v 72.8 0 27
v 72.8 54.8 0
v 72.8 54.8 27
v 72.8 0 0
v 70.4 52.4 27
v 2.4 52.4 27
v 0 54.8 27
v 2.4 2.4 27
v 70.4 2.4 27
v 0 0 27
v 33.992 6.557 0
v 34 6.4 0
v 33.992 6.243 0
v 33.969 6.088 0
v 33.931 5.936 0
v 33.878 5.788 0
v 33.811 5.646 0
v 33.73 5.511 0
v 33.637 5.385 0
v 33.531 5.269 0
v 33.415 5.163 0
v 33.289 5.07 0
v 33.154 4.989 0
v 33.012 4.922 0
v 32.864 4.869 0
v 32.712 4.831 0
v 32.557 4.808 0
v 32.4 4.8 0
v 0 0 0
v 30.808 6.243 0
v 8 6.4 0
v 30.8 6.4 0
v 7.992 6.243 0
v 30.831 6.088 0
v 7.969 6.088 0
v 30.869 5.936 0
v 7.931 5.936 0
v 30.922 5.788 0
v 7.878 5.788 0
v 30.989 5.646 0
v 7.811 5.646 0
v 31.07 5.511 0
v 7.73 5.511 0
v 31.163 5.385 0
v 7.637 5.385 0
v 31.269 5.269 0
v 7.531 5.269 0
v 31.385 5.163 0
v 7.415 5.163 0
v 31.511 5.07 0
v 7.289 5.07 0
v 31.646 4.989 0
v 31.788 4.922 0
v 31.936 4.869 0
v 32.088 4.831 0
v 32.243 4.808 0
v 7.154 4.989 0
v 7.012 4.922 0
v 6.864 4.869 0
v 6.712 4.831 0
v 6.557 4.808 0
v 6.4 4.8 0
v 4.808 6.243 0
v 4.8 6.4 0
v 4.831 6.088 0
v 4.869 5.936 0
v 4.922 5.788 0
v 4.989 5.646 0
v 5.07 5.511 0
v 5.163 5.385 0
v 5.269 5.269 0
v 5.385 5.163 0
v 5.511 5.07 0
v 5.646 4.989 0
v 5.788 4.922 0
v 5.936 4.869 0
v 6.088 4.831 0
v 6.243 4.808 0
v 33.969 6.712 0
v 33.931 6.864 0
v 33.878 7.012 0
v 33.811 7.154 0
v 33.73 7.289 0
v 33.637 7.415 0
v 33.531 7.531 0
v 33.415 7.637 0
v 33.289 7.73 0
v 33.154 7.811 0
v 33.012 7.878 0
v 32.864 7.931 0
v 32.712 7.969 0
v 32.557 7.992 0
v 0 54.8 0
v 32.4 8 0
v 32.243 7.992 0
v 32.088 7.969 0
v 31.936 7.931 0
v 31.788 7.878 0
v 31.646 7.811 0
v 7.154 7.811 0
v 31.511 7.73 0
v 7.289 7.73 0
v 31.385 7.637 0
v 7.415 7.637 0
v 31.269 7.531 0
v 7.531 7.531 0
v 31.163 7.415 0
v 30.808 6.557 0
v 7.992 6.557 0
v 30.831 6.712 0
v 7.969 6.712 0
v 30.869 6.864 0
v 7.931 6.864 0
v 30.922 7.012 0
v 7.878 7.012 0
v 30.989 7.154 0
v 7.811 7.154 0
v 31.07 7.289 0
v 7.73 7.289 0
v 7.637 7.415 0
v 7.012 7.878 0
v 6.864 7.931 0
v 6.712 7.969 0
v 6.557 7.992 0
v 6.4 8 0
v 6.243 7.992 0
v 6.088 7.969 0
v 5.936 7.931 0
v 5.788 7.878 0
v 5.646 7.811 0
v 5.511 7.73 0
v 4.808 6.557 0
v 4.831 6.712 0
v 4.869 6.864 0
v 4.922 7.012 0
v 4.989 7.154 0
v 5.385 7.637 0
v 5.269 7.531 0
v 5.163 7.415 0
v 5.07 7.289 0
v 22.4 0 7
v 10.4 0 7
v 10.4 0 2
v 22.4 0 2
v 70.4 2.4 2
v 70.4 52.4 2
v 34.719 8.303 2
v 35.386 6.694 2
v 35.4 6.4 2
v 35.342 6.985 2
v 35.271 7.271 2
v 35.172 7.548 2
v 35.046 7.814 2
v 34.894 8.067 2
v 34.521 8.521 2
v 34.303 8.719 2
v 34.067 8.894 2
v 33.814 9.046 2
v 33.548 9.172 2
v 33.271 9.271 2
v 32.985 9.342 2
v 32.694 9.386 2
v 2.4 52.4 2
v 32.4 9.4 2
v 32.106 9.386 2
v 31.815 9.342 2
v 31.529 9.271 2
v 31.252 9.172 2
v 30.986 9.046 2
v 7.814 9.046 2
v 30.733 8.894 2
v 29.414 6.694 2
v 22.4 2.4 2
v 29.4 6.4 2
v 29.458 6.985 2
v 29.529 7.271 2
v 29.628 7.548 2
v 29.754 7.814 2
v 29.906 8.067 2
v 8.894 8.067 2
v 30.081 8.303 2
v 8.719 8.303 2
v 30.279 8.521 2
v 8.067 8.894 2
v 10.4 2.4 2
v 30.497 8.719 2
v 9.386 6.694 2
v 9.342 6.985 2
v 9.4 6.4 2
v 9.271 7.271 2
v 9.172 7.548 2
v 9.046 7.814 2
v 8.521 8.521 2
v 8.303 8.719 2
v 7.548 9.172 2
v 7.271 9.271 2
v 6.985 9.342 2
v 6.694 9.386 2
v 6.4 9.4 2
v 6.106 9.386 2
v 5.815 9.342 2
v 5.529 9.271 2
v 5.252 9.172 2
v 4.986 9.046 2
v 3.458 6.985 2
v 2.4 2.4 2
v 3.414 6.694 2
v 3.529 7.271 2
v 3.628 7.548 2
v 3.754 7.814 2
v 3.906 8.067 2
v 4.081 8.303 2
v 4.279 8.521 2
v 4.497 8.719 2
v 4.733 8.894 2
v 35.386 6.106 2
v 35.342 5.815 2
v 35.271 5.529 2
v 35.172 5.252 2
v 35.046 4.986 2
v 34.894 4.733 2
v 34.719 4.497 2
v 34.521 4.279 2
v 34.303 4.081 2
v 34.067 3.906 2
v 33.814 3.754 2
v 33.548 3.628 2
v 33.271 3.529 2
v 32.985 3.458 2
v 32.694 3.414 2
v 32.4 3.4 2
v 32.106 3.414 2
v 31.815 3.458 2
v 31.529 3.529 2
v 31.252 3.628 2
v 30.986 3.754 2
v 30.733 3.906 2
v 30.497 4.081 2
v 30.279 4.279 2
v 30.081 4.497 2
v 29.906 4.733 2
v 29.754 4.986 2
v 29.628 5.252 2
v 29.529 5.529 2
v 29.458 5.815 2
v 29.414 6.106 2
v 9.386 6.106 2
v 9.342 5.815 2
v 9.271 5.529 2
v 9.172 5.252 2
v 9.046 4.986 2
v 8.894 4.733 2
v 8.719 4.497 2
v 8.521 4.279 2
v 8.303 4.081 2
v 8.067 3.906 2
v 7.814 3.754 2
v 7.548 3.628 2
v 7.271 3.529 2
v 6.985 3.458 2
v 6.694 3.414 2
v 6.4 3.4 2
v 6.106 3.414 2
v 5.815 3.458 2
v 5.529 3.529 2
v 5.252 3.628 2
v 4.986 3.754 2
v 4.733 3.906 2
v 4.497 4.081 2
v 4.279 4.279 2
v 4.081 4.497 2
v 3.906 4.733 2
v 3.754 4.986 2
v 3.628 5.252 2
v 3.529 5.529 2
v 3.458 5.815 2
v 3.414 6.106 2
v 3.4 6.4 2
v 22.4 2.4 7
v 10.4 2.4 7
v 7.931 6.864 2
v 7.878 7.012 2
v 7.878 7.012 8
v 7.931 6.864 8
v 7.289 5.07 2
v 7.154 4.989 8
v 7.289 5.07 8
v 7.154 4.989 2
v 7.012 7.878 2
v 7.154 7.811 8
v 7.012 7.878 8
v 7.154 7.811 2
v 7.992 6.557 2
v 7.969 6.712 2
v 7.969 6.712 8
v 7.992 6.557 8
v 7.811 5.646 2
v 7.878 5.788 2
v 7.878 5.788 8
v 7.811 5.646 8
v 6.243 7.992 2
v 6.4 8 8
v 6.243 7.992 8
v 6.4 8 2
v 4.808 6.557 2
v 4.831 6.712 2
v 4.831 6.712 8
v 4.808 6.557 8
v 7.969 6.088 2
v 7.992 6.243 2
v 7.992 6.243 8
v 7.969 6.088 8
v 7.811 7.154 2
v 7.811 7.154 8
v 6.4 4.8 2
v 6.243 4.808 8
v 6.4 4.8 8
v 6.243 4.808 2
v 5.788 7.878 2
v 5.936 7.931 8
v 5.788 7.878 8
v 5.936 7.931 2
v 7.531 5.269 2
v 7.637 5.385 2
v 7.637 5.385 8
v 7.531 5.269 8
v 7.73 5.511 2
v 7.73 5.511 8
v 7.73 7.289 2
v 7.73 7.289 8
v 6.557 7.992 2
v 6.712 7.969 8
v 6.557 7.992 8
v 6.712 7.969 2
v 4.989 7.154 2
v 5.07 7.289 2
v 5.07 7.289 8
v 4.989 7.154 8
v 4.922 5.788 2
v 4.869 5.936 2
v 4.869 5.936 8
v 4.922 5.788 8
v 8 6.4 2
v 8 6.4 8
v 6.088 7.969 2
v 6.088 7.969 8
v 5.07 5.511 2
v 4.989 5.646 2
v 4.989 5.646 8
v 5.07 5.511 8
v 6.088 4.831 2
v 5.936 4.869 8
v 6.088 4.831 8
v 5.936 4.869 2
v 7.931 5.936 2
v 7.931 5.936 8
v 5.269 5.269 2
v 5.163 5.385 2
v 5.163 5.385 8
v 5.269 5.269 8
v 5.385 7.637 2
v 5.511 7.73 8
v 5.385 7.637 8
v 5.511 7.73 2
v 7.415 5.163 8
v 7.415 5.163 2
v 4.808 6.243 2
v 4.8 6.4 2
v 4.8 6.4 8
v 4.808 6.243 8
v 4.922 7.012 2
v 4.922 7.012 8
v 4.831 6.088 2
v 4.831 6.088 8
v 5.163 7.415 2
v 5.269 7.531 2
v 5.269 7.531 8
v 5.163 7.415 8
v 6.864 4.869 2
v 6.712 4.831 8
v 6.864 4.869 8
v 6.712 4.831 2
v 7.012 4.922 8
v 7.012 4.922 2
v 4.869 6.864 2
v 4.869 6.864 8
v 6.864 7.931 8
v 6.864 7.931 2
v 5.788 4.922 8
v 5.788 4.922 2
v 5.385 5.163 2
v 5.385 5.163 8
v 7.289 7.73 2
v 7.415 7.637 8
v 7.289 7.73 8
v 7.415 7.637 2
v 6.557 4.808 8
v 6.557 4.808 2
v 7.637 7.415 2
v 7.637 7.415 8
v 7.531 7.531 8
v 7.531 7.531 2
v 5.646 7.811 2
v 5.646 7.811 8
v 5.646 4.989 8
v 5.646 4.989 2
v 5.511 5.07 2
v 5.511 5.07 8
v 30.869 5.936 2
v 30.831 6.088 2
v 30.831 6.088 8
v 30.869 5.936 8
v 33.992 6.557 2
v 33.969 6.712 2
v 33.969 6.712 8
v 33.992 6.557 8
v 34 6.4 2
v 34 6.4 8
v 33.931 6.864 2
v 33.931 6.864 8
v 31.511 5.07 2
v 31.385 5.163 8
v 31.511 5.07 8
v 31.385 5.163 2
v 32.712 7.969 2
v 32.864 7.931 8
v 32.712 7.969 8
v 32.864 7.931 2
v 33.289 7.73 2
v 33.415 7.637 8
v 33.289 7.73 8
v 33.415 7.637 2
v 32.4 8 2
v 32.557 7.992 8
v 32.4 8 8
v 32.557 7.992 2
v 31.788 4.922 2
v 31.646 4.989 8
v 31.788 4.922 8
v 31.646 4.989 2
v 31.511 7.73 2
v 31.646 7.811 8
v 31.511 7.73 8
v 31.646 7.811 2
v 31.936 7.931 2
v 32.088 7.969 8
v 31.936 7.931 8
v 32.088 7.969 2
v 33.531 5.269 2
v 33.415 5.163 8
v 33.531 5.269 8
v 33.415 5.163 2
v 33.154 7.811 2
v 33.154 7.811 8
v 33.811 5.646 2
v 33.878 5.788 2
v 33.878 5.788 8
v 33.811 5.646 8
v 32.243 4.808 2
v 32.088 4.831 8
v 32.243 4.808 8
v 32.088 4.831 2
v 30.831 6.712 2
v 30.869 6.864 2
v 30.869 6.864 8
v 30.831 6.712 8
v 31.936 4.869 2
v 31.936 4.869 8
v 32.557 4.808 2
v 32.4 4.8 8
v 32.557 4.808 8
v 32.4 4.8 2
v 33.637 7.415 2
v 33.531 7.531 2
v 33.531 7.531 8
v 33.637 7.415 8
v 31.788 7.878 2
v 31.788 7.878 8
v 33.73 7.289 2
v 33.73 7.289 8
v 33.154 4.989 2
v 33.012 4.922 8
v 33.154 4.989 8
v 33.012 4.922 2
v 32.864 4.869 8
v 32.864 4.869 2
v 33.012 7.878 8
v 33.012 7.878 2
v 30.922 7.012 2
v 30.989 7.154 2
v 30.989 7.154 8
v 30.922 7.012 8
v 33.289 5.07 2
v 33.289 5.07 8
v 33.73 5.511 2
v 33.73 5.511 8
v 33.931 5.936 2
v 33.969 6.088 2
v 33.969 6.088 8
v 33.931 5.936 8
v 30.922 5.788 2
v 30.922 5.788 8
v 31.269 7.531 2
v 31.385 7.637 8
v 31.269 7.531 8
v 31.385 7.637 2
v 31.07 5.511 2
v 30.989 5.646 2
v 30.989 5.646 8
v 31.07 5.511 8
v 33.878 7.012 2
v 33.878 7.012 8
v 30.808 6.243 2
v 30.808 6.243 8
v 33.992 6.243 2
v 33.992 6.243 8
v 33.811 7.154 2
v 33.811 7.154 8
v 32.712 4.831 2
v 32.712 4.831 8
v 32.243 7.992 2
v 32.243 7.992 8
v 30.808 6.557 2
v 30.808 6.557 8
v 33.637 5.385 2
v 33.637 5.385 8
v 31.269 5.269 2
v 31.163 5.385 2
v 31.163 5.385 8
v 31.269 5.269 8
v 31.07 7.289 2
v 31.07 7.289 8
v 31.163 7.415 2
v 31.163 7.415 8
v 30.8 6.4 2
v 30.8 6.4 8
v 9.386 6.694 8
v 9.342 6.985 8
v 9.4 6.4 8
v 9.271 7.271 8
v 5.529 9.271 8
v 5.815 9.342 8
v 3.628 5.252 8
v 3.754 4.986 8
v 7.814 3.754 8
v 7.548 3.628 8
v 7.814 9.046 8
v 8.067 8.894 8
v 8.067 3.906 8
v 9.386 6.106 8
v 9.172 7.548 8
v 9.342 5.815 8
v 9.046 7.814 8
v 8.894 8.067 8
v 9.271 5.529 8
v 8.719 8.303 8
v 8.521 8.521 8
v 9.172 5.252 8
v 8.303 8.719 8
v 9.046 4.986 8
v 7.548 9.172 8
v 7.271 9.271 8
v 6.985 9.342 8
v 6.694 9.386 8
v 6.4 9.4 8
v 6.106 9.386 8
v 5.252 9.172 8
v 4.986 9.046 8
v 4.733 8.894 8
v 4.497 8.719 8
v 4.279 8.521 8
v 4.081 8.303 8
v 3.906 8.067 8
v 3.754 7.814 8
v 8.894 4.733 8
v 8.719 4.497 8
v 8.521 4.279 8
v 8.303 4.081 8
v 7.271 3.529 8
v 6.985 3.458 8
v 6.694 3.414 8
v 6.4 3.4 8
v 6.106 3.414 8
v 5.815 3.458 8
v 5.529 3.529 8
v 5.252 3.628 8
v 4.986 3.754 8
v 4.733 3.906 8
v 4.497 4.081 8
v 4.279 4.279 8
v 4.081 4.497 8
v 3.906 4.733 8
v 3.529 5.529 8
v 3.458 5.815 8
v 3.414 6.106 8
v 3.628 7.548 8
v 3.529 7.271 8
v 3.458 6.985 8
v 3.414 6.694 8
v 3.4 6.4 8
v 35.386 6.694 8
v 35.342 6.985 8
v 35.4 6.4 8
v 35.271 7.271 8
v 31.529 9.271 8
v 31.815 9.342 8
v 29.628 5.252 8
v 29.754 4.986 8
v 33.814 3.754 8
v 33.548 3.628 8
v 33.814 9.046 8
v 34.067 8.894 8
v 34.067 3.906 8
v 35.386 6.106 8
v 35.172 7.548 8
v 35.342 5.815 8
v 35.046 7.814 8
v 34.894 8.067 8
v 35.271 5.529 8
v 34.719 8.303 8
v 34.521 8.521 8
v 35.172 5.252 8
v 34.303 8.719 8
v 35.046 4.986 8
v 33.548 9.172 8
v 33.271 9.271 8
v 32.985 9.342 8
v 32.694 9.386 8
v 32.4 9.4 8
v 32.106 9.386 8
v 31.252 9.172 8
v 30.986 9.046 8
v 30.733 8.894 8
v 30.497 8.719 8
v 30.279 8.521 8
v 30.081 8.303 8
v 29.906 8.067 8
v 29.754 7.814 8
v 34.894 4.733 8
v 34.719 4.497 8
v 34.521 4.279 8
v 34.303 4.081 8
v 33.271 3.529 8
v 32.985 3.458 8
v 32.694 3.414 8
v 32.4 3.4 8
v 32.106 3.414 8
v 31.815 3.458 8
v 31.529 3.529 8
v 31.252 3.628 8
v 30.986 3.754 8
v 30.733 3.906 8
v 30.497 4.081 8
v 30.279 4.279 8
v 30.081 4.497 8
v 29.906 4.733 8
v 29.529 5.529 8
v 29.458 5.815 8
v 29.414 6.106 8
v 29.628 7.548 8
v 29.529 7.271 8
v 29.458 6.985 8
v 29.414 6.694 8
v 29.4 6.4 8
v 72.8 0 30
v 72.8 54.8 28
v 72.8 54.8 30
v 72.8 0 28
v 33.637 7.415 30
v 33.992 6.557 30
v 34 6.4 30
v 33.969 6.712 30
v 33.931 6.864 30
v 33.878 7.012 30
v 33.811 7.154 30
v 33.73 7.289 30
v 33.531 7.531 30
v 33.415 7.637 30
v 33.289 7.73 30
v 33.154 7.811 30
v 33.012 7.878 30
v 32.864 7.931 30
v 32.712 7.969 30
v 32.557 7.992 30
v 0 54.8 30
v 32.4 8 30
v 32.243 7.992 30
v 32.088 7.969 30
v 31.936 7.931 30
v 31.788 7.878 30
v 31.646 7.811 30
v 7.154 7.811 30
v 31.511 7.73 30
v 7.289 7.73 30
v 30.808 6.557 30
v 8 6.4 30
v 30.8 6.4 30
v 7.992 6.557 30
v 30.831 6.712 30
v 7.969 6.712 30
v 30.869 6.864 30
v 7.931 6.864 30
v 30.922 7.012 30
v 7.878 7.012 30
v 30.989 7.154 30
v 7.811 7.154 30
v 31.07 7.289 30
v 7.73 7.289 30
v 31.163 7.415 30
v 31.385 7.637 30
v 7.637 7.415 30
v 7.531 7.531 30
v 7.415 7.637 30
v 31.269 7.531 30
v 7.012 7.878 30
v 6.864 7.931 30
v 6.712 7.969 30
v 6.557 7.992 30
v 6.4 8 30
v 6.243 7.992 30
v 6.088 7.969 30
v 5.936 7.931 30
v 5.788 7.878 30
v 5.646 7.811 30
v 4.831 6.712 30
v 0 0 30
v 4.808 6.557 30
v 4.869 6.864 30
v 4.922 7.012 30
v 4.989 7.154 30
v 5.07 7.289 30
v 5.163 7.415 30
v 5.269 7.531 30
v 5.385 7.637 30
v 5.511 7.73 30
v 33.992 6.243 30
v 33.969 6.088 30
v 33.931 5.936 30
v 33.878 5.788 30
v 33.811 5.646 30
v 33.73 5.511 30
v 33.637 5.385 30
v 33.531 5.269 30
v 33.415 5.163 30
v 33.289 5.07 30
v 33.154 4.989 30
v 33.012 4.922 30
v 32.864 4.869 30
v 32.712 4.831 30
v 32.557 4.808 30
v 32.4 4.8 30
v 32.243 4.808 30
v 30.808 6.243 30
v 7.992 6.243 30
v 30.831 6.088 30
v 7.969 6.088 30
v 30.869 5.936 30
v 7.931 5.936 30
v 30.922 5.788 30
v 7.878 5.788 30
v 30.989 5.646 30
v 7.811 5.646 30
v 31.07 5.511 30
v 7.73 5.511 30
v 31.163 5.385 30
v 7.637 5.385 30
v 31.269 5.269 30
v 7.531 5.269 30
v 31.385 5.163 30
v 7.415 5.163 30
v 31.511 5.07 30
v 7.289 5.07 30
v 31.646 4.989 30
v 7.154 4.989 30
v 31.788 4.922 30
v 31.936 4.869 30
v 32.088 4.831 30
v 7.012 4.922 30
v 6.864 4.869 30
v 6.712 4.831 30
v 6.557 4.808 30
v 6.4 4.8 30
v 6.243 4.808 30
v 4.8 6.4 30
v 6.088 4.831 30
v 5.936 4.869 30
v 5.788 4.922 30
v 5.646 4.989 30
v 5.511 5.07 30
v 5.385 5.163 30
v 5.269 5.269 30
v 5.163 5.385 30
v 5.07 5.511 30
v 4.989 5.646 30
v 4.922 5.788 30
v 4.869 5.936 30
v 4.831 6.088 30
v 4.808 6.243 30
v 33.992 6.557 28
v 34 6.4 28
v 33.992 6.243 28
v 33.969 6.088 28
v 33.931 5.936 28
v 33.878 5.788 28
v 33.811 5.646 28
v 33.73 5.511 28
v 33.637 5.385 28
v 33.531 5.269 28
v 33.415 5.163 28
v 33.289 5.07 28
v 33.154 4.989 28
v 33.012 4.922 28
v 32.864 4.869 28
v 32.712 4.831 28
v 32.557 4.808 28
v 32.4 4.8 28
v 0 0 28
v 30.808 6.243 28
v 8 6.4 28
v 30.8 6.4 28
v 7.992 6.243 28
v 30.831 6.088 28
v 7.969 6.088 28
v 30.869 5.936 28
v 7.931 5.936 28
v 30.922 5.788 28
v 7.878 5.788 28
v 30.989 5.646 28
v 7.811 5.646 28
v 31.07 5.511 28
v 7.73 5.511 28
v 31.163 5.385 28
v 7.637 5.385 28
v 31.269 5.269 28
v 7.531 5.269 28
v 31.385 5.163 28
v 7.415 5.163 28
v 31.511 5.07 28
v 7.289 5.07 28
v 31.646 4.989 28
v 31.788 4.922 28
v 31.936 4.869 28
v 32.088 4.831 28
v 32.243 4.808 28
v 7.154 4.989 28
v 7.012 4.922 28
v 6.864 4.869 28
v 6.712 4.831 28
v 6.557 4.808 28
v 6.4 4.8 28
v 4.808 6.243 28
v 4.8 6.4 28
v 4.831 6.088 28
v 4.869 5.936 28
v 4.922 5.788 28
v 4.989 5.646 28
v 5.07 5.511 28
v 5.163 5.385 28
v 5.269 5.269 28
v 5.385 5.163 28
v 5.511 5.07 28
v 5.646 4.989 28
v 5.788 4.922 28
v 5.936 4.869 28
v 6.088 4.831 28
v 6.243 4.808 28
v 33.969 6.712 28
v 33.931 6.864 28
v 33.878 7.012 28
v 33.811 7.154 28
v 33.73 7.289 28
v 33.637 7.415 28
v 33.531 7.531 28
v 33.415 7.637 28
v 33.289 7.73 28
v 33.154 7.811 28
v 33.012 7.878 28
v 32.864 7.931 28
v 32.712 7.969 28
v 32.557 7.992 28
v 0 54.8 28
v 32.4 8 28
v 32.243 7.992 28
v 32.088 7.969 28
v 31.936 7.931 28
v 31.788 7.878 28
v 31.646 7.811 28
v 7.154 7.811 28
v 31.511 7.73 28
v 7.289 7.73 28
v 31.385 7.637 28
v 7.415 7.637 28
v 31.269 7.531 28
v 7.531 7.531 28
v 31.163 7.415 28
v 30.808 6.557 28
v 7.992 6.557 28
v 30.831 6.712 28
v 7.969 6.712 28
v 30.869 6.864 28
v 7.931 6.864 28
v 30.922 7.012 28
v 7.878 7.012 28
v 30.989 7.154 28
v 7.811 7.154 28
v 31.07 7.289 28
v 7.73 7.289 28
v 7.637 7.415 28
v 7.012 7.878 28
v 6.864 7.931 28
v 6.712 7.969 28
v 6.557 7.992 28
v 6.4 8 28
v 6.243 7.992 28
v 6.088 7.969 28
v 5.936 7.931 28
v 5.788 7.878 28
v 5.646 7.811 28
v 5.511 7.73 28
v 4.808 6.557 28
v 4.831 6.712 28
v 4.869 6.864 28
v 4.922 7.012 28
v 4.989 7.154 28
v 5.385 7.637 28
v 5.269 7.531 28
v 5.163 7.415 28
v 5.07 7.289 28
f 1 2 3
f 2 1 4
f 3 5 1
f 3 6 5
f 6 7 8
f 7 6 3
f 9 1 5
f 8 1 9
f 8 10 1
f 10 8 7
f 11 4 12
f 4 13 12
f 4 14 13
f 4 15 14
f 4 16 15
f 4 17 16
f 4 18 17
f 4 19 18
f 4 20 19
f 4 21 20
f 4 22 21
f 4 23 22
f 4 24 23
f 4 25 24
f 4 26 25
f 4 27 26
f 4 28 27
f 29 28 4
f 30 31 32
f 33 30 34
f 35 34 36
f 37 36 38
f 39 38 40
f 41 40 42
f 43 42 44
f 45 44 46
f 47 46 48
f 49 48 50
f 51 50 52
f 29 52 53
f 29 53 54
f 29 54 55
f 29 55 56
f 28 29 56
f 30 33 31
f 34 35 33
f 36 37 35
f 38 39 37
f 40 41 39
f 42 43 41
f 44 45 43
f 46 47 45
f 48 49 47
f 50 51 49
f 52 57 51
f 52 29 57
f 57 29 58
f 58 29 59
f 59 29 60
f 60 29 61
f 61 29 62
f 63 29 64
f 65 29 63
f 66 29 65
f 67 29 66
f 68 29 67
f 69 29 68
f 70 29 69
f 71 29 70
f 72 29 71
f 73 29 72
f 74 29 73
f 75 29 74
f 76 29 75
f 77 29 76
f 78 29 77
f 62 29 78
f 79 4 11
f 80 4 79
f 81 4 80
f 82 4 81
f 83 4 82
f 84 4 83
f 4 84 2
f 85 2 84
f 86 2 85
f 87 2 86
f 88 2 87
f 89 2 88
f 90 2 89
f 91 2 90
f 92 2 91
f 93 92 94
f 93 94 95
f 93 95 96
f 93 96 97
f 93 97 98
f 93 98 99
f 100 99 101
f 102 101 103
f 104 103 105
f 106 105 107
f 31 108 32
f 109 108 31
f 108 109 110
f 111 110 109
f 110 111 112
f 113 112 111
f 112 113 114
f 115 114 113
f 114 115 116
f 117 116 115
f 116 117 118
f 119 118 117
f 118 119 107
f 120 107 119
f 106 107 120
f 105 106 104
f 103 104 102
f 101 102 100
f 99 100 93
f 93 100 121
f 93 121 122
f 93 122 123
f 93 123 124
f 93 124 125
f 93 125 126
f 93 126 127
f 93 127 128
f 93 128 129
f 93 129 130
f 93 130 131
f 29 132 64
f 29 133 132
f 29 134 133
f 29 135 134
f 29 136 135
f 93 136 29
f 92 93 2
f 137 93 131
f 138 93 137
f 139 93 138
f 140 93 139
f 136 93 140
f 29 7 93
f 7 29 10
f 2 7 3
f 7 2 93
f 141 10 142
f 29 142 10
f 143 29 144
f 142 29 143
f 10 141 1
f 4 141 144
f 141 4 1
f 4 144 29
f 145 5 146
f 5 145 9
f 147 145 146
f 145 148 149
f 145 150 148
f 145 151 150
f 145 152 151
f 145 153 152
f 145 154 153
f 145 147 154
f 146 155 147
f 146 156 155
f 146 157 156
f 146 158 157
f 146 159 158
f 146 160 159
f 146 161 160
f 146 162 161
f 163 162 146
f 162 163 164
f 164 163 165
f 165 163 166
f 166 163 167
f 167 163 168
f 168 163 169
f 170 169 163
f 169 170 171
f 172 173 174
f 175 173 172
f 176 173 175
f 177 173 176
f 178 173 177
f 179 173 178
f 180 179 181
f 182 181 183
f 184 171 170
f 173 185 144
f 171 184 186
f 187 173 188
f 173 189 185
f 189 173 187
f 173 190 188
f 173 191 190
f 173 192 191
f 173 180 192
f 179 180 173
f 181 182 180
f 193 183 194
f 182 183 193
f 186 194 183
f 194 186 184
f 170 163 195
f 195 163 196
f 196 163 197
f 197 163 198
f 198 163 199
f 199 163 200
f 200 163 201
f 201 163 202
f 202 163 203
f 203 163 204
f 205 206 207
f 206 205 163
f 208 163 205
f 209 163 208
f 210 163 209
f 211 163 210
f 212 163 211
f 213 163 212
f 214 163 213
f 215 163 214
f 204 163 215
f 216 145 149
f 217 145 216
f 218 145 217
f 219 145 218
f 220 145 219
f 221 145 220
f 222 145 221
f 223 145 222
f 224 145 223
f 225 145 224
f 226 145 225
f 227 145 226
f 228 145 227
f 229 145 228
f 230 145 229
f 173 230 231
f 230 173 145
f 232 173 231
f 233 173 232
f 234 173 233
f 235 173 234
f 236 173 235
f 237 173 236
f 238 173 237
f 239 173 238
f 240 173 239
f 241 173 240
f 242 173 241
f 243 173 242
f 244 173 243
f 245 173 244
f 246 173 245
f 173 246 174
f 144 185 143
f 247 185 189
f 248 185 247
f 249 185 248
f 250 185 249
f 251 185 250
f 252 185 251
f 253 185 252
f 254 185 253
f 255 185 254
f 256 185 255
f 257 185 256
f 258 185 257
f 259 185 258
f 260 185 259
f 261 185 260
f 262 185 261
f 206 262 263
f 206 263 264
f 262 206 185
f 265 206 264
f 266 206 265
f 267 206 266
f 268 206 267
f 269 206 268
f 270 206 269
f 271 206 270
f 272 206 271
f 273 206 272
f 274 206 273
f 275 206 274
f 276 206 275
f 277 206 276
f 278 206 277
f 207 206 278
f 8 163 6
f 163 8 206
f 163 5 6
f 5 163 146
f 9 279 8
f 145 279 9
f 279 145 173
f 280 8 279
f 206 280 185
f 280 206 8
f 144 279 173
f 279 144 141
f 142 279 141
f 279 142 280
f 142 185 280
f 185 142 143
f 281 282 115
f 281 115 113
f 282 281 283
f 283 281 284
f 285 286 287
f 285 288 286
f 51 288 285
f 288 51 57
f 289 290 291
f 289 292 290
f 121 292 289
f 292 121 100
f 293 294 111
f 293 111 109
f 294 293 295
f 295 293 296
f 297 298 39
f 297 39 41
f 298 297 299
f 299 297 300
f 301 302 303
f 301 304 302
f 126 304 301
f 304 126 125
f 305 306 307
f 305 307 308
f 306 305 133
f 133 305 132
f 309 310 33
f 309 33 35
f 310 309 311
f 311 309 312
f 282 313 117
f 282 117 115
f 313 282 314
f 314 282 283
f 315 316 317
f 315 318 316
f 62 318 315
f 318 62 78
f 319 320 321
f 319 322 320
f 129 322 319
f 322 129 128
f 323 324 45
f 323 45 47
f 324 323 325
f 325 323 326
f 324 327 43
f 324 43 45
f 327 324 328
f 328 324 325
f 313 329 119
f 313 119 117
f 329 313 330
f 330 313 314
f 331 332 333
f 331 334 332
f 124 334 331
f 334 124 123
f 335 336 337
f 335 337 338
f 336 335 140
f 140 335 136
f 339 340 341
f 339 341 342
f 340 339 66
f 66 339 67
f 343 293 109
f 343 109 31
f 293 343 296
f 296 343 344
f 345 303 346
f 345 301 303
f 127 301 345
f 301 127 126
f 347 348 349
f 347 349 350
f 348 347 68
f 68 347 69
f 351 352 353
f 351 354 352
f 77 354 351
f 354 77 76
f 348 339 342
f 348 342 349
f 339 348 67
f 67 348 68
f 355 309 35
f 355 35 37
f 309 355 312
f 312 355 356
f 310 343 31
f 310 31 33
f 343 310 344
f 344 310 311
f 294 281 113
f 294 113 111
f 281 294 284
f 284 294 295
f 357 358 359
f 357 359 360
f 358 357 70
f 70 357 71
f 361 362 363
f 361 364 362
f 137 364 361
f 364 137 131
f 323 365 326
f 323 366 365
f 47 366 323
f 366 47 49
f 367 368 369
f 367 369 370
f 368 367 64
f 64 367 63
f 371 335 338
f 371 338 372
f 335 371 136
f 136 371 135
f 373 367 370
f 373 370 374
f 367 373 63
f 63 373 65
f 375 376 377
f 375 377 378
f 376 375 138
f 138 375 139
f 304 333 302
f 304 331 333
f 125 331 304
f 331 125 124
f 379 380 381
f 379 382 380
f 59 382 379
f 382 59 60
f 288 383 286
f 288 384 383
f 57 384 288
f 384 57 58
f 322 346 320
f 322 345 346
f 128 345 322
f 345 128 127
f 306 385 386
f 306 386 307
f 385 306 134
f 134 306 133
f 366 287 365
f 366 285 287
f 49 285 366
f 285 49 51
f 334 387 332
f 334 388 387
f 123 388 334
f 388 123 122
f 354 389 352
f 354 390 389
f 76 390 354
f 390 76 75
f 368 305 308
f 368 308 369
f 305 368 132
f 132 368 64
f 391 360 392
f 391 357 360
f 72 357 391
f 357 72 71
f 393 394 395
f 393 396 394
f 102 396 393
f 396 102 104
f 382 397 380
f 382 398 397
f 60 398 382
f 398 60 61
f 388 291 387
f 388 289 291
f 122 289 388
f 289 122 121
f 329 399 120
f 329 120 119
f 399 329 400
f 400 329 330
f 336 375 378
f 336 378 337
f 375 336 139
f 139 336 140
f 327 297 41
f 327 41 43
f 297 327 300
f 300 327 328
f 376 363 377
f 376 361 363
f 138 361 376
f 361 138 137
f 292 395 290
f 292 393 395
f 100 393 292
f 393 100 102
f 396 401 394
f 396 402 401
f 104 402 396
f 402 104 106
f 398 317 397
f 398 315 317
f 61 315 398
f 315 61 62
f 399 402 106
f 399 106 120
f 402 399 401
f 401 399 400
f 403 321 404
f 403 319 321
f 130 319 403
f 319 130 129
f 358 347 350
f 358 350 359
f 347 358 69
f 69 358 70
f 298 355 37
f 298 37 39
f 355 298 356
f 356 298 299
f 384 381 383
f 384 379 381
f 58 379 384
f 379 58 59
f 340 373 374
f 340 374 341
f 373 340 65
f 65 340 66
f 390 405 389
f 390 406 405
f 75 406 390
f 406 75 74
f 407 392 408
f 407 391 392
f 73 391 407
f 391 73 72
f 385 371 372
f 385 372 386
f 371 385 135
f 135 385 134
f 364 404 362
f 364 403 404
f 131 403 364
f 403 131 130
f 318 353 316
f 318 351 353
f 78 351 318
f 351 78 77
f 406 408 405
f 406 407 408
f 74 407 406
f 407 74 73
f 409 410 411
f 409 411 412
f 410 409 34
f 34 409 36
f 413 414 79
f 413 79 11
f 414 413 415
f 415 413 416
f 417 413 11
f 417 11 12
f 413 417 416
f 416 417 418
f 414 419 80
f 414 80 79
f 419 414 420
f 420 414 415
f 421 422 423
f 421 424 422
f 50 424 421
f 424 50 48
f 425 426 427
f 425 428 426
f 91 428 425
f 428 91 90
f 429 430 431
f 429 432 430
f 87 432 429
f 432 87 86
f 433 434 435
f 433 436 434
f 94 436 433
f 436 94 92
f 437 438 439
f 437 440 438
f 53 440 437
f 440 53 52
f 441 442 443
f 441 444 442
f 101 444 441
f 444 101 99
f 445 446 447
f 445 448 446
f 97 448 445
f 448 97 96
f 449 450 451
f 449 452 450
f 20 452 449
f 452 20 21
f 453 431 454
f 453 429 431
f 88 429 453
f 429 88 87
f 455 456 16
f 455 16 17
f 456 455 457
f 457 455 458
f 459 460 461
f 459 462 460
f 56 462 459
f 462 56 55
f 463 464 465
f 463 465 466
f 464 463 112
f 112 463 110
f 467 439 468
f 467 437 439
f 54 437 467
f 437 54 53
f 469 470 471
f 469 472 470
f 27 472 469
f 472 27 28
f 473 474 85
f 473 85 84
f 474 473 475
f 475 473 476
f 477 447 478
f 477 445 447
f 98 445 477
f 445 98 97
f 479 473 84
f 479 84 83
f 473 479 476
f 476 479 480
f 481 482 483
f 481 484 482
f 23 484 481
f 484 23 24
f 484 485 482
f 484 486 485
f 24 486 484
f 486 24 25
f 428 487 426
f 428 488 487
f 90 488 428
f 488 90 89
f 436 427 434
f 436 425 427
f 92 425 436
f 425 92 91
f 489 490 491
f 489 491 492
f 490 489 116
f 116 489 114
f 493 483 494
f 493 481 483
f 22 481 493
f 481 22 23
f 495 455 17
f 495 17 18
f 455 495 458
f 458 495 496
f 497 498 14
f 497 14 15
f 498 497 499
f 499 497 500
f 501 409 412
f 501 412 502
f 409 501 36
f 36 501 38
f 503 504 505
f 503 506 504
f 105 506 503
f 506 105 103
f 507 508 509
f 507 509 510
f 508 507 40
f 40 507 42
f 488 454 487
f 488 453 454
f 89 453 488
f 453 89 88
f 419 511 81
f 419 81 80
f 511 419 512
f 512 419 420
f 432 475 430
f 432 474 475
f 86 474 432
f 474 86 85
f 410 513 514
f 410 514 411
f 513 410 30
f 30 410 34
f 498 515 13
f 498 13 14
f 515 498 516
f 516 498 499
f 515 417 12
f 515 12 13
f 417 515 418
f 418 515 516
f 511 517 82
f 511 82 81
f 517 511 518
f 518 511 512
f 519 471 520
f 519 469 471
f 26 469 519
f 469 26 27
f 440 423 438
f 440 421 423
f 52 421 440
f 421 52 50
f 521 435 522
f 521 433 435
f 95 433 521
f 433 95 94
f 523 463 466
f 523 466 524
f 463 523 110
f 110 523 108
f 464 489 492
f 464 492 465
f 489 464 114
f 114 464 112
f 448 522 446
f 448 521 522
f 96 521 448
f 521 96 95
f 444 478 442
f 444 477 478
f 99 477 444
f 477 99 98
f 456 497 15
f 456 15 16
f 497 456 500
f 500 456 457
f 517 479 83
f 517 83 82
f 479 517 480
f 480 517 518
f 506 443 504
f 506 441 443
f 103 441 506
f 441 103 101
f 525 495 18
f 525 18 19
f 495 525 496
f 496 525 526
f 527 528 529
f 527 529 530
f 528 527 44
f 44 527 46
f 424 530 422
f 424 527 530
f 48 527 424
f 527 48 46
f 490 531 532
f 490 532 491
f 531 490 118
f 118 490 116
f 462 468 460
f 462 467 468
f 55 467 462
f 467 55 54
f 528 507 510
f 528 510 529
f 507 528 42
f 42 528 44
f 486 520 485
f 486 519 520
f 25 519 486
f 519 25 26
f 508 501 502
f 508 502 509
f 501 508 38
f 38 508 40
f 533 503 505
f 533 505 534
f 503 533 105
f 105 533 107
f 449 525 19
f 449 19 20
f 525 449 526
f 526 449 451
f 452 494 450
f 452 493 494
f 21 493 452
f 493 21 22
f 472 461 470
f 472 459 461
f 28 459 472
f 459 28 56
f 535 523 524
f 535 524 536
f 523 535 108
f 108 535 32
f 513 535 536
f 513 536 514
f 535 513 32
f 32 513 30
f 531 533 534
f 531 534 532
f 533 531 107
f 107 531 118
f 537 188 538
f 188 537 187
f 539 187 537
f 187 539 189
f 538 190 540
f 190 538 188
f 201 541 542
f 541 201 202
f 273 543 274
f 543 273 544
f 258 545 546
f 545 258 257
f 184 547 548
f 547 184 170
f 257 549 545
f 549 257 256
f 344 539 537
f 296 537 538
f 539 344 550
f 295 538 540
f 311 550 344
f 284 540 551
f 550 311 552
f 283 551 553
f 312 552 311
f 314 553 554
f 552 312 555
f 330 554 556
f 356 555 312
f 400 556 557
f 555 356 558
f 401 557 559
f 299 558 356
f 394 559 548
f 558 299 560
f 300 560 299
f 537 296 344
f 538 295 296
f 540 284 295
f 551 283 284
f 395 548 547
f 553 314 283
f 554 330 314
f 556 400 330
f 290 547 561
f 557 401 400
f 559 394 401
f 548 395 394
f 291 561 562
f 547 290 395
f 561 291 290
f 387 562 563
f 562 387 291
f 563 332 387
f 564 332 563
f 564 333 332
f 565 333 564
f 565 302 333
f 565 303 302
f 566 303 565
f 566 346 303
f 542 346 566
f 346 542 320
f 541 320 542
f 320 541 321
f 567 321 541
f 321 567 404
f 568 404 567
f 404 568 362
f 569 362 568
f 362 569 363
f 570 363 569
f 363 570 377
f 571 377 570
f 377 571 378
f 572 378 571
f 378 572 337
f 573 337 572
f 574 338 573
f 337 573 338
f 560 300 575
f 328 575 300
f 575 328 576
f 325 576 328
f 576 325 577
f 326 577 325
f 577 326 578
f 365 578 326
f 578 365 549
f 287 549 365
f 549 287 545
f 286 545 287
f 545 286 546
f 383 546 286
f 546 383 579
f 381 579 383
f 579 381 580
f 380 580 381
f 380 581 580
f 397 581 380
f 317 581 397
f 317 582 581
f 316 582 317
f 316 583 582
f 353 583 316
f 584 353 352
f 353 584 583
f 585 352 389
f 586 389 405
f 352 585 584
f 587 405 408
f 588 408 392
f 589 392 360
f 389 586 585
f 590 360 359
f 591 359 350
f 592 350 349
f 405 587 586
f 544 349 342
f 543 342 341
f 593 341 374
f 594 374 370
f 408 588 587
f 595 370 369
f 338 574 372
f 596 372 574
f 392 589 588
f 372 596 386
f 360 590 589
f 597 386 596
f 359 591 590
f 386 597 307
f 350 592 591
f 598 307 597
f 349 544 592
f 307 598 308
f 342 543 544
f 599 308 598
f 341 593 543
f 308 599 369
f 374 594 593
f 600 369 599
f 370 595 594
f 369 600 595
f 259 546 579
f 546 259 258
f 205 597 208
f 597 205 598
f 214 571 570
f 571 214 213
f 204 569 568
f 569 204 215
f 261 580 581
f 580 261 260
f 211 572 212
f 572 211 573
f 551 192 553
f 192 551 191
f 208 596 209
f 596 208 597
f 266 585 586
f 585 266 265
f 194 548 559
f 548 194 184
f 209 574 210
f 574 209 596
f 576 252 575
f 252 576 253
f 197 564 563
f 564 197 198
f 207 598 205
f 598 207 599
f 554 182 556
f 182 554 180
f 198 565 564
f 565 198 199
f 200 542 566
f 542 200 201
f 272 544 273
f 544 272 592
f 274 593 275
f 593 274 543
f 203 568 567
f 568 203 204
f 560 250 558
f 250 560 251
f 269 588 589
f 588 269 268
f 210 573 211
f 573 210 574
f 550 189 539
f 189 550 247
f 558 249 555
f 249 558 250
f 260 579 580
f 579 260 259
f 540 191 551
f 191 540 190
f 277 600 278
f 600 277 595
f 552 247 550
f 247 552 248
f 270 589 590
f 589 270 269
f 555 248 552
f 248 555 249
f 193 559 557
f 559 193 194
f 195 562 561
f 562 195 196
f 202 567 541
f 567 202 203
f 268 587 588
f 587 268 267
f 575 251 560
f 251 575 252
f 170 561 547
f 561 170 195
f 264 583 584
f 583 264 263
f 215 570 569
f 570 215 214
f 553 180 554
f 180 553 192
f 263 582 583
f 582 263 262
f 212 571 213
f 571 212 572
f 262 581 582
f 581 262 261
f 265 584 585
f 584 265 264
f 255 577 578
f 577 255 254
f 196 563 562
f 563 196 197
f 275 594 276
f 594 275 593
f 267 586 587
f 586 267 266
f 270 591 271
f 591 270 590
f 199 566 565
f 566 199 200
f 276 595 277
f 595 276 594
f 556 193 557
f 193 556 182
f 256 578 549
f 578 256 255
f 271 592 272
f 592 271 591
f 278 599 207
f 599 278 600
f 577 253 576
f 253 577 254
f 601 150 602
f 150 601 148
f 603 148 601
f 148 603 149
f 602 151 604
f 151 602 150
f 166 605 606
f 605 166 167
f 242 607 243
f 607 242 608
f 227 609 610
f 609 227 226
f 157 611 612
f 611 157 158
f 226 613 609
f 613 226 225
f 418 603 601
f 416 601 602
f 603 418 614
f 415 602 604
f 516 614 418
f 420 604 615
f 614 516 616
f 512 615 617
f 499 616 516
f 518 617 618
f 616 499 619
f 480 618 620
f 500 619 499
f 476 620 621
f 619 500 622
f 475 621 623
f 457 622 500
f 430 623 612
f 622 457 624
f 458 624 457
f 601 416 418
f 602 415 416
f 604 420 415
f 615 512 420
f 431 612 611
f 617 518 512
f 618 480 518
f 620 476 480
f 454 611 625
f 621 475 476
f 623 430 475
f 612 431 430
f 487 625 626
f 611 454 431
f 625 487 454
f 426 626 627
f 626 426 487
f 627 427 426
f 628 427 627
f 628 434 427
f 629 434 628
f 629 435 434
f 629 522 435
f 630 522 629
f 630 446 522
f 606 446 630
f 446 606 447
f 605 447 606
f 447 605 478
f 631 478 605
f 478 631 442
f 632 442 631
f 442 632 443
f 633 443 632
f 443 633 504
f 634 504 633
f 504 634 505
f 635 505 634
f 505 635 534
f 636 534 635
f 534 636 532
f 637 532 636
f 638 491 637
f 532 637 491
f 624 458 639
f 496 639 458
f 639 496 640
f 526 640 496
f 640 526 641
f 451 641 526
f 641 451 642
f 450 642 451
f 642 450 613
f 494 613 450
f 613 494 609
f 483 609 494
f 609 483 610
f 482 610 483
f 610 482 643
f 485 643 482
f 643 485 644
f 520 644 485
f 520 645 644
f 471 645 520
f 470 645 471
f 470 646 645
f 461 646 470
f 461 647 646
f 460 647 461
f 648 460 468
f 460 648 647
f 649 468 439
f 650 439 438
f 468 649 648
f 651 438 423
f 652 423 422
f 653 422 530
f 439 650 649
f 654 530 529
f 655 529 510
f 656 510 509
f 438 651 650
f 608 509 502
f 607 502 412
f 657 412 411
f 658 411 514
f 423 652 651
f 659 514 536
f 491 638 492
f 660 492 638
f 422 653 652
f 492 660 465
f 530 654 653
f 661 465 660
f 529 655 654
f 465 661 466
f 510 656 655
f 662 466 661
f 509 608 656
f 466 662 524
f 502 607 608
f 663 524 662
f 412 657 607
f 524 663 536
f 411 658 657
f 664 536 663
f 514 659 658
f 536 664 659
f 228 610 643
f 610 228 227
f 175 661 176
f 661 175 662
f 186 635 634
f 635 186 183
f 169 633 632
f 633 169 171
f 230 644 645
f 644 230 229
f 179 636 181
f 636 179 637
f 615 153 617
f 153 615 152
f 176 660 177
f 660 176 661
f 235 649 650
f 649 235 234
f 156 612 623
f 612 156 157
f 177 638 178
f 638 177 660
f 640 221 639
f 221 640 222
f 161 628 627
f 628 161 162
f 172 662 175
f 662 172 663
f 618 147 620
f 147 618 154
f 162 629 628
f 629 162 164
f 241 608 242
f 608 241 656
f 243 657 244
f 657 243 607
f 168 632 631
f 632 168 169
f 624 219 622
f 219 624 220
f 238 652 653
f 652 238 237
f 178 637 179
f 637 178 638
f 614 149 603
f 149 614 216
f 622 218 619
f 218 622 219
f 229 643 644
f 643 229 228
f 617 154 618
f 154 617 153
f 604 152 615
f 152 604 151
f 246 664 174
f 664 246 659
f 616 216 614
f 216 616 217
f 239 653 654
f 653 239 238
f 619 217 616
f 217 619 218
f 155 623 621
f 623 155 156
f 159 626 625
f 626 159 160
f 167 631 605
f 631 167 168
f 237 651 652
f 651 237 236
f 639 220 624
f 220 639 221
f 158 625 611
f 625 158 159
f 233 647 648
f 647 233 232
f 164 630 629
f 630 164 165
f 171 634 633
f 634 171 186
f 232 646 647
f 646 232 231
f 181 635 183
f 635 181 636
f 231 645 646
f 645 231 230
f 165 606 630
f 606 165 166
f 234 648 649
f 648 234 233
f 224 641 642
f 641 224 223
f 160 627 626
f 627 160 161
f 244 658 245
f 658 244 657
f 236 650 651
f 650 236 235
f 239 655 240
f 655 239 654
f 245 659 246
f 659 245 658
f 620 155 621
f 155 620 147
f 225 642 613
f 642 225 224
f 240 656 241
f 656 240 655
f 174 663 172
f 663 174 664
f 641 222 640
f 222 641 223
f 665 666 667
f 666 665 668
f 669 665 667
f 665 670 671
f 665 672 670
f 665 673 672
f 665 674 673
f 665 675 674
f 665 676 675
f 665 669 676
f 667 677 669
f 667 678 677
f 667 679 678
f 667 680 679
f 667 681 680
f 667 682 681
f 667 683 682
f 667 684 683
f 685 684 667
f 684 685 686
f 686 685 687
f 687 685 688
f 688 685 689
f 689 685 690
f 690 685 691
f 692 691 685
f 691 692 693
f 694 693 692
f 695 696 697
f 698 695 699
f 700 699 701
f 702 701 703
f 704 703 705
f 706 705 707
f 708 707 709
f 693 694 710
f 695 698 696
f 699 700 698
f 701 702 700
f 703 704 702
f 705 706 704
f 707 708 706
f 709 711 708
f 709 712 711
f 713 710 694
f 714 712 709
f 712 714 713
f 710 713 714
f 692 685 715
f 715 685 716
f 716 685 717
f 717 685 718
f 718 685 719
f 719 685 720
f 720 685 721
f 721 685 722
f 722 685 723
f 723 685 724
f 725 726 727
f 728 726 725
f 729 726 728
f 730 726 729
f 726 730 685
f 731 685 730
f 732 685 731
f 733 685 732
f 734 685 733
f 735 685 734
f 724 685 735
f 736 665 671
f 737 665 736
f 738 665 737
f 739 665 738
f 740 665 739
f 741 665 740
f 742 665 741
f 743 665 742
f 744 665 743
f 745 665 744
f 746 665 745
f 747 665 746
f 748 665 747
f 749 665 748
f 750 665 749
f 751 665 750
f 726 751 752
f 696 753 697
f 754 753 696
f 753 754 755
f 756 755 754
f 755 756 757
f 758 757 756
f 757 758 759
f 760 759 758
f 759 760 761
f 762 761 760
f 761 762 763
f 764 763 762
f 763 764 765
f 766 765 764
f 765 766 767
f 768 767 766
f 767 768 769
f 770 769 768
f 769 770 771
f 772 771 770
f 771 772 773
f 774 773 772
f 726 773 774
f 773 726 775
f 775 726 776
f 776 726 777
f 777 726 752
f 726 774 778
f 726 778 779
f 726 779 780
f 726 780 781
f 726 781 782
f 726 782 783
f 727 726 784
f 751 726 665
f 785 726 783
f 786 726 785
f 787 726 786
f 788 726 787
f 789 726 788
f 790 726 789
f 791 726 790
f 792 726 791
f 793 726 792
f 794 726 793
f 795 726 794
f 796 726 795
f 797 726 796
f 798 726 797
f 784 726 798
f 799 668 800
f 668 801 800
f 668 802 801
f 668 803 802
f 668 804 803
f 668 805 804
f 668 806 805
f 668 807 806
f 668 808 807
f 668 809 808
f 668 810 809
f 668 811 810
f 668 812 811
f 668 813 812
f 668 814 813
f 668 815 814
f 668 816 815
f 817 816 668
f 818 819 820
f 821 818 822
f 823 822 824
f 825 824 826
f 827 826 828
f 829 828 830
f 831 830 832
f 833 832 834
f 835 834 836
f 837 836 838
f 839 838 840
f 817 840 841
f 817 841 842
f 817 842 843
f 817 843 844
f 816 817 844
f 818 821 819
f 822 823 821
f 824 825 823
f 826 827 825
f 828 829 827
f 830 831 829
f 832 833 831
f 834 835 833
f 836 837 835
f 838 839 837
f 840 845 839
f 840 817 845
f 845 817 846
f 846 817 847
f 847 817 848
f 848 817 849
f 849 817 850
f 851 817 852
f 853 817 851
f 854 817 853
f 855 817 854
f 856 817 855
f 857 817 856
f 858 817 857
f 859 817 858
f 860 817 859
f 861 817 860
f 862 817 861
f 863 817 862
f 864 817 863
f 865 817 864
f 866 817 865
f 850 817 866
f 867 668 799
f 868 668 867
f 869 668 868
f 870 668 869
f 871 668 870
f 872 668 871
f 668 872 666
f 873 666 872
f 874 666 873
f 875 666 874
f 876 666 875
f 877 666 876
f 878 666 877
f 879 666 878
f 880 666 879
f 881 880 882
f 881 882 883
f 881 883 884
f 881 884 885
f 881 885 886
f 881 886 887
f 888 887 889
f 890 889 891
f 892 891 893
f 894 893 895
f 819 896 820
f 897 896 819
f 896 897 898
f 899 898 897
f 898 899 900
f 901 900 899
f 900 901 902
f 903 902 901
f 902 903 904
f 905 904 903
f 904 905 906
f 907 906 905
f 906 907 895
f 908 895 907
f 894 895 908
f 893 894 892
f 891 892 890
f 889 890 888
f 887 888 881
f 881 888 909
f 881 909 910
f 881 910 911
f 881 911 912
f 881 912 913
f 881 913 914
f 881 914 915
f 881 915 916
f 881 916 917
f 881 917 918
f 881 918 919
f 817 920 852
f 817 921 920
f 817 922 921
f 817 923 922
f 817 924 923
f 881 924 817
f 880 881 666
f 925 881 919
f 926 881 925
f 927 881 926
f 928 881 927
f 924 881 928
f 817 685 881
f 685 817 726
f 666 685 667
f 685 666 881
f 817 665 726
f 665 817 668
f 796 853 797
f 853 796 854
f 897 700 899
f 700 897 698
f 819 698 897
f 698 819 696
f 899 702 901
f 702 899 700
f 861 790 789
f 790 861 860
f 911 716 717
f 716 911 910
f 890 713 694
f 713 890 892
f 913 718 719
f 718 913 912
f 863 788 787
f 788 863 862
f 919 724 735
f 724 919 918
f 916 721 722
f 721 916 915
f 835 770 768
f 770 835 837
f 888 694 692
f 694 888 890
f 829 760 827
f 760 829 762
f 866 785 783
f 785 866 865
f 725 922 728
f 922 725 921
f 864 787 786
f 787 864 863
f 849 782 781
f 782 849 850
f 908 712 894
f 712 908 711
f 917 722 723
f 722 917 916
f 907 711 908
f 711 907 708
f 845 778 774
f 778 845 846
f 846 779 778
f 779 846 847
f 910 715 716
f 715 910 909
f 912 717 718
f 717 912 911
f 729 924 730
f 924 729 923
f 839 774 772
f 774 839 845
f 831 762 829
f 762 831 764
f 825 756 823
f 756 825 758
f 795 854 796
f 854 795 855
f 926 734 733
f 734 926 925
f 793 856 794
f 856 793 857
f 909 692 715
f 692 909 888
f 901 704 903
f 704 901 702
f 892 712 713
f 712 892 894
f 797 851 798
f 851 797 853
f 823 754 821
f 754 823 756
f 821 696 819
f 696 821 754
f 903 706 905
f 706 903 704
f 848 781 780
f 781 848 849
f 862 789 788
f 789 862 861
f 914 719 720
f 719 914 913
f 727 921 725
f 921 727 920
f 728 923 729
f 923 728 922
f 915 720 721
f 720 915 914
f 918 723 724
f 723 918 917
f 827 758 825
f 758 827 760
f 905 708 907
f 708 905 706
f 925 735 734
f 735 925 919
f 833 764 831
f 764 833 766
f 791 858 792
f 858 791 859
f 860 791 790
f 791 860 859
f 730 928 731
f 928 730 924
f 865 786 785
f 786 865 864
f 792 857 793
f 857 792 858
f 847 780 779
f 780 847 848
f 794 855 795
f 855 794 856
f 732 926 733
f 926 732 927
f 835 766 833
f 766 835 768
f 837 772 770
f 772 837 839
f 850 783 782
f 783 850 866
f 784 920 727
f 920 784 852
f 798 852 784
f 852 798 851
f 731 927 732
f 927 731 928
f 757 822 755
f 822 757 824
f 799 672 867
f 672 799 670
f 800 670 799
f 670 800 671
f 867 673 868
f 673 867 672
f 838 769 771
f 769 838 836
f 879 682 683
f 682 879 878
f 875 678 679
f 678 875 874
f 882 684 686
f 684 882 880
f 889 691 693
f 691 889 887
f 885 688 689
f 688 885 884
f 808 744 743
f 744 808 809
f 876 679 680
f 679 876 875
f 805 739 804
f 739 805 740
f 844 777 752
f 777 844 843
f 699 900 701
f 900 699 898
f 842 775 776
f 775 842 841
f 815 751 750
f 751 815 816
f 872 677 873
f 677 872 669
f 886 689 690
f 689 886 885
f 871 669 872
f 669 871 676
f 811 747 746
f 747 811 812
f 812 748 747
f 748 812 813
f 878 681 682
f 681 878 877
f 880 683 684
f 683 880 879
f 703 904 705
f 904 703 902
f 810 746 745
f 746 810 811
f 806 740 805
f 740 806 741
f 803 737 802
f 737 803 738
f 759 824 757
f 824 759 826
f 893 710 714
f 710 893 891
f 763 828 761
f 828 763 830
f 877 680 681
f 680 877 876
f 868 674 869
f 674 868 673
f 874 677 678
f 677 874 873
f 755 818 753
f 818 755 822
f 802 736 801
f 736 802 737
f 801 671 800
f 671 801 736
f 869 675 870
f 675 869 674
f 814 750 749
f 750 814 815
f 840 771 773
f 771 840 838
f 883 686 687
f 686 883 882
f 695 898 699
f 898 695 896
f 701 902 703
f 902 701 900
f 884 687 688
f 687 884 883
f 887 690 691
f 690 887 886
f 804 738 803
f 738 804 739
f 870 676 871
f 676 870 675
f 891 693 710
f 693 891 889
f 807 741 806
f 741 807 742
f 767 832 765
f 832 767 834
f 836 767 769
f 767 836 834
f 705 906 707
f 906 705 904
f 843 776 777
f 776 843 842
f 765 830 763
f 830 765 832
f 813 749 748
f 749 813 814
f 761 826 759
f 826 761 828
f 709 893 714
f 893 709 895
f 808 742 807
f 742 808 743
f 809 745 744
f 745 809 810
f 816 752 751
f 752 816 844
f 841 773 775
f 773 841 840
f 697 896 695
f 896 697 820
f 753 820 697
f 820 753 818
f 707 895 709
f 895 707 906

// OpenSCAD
// Auto-generated by Mecha-Splicer
// enclosure=ctrl_box_3_enclosure

$fn = 64;

inner_w = 68.0;
inner_d = 50.0;
inner_h = 25.0;
wall = 2.4;
floor = 2.0;
lid_t = 2.0;
standoff_h = 6.0;
standoff_od = 6.0;
standoff_hole_d = 3.2;

module base() {
  union() {
    difference() {
      cube([72.8, 54.8, 27.0], center=false);
      translate([2.4, 2.4, 2.0]) cube([68.0, 50.0, 25.0], center=false);
    translate([10.4, 0, 2.0]) cube([12.0, 3.4, 5.0], center=false);
      translate([6.4, 6.4, -1]) cylinder(h=29.0, d=3.2, center=false);
      translate([32.4, 6.4, -1]) cylinder(h=29.0, d=3.2, center=false);
    }
    // Standoffs
    difference() {
      union() {
        translate([6.4, 6.4, 2.0]) cylinder(h=standoff_h, d=standoff_od, center=false);
        translate([32.4, 6.4, 2.0]) cylinder(h=standoff_h, d=standoff_od, center=false);
      }
      translate([6.4, 6.4, 1.0]) cylinder(h=standoff_h + 2, d=standoff_hole_d, center=false);
      translate([32.4, 6.4, 1.0]) cylinder(h=standoff_h + 2, d=standoff_hole_d, center=false);
    }
  }
}

module lid() {
  difference() {
    cube([72.8, 54.8, 2.0], center=false);
    translate([6.4, 6.4, -1]) cylinder(h=4.0, d=3.2, center=false);
    translate([32.4, 6.4, -1]) cylinder(h=4.0, d=3.2, center=false);
  }
}

module enclosure() {
  base();
  translate([0, 0, 28.0]) lid();
}
enclosure();
